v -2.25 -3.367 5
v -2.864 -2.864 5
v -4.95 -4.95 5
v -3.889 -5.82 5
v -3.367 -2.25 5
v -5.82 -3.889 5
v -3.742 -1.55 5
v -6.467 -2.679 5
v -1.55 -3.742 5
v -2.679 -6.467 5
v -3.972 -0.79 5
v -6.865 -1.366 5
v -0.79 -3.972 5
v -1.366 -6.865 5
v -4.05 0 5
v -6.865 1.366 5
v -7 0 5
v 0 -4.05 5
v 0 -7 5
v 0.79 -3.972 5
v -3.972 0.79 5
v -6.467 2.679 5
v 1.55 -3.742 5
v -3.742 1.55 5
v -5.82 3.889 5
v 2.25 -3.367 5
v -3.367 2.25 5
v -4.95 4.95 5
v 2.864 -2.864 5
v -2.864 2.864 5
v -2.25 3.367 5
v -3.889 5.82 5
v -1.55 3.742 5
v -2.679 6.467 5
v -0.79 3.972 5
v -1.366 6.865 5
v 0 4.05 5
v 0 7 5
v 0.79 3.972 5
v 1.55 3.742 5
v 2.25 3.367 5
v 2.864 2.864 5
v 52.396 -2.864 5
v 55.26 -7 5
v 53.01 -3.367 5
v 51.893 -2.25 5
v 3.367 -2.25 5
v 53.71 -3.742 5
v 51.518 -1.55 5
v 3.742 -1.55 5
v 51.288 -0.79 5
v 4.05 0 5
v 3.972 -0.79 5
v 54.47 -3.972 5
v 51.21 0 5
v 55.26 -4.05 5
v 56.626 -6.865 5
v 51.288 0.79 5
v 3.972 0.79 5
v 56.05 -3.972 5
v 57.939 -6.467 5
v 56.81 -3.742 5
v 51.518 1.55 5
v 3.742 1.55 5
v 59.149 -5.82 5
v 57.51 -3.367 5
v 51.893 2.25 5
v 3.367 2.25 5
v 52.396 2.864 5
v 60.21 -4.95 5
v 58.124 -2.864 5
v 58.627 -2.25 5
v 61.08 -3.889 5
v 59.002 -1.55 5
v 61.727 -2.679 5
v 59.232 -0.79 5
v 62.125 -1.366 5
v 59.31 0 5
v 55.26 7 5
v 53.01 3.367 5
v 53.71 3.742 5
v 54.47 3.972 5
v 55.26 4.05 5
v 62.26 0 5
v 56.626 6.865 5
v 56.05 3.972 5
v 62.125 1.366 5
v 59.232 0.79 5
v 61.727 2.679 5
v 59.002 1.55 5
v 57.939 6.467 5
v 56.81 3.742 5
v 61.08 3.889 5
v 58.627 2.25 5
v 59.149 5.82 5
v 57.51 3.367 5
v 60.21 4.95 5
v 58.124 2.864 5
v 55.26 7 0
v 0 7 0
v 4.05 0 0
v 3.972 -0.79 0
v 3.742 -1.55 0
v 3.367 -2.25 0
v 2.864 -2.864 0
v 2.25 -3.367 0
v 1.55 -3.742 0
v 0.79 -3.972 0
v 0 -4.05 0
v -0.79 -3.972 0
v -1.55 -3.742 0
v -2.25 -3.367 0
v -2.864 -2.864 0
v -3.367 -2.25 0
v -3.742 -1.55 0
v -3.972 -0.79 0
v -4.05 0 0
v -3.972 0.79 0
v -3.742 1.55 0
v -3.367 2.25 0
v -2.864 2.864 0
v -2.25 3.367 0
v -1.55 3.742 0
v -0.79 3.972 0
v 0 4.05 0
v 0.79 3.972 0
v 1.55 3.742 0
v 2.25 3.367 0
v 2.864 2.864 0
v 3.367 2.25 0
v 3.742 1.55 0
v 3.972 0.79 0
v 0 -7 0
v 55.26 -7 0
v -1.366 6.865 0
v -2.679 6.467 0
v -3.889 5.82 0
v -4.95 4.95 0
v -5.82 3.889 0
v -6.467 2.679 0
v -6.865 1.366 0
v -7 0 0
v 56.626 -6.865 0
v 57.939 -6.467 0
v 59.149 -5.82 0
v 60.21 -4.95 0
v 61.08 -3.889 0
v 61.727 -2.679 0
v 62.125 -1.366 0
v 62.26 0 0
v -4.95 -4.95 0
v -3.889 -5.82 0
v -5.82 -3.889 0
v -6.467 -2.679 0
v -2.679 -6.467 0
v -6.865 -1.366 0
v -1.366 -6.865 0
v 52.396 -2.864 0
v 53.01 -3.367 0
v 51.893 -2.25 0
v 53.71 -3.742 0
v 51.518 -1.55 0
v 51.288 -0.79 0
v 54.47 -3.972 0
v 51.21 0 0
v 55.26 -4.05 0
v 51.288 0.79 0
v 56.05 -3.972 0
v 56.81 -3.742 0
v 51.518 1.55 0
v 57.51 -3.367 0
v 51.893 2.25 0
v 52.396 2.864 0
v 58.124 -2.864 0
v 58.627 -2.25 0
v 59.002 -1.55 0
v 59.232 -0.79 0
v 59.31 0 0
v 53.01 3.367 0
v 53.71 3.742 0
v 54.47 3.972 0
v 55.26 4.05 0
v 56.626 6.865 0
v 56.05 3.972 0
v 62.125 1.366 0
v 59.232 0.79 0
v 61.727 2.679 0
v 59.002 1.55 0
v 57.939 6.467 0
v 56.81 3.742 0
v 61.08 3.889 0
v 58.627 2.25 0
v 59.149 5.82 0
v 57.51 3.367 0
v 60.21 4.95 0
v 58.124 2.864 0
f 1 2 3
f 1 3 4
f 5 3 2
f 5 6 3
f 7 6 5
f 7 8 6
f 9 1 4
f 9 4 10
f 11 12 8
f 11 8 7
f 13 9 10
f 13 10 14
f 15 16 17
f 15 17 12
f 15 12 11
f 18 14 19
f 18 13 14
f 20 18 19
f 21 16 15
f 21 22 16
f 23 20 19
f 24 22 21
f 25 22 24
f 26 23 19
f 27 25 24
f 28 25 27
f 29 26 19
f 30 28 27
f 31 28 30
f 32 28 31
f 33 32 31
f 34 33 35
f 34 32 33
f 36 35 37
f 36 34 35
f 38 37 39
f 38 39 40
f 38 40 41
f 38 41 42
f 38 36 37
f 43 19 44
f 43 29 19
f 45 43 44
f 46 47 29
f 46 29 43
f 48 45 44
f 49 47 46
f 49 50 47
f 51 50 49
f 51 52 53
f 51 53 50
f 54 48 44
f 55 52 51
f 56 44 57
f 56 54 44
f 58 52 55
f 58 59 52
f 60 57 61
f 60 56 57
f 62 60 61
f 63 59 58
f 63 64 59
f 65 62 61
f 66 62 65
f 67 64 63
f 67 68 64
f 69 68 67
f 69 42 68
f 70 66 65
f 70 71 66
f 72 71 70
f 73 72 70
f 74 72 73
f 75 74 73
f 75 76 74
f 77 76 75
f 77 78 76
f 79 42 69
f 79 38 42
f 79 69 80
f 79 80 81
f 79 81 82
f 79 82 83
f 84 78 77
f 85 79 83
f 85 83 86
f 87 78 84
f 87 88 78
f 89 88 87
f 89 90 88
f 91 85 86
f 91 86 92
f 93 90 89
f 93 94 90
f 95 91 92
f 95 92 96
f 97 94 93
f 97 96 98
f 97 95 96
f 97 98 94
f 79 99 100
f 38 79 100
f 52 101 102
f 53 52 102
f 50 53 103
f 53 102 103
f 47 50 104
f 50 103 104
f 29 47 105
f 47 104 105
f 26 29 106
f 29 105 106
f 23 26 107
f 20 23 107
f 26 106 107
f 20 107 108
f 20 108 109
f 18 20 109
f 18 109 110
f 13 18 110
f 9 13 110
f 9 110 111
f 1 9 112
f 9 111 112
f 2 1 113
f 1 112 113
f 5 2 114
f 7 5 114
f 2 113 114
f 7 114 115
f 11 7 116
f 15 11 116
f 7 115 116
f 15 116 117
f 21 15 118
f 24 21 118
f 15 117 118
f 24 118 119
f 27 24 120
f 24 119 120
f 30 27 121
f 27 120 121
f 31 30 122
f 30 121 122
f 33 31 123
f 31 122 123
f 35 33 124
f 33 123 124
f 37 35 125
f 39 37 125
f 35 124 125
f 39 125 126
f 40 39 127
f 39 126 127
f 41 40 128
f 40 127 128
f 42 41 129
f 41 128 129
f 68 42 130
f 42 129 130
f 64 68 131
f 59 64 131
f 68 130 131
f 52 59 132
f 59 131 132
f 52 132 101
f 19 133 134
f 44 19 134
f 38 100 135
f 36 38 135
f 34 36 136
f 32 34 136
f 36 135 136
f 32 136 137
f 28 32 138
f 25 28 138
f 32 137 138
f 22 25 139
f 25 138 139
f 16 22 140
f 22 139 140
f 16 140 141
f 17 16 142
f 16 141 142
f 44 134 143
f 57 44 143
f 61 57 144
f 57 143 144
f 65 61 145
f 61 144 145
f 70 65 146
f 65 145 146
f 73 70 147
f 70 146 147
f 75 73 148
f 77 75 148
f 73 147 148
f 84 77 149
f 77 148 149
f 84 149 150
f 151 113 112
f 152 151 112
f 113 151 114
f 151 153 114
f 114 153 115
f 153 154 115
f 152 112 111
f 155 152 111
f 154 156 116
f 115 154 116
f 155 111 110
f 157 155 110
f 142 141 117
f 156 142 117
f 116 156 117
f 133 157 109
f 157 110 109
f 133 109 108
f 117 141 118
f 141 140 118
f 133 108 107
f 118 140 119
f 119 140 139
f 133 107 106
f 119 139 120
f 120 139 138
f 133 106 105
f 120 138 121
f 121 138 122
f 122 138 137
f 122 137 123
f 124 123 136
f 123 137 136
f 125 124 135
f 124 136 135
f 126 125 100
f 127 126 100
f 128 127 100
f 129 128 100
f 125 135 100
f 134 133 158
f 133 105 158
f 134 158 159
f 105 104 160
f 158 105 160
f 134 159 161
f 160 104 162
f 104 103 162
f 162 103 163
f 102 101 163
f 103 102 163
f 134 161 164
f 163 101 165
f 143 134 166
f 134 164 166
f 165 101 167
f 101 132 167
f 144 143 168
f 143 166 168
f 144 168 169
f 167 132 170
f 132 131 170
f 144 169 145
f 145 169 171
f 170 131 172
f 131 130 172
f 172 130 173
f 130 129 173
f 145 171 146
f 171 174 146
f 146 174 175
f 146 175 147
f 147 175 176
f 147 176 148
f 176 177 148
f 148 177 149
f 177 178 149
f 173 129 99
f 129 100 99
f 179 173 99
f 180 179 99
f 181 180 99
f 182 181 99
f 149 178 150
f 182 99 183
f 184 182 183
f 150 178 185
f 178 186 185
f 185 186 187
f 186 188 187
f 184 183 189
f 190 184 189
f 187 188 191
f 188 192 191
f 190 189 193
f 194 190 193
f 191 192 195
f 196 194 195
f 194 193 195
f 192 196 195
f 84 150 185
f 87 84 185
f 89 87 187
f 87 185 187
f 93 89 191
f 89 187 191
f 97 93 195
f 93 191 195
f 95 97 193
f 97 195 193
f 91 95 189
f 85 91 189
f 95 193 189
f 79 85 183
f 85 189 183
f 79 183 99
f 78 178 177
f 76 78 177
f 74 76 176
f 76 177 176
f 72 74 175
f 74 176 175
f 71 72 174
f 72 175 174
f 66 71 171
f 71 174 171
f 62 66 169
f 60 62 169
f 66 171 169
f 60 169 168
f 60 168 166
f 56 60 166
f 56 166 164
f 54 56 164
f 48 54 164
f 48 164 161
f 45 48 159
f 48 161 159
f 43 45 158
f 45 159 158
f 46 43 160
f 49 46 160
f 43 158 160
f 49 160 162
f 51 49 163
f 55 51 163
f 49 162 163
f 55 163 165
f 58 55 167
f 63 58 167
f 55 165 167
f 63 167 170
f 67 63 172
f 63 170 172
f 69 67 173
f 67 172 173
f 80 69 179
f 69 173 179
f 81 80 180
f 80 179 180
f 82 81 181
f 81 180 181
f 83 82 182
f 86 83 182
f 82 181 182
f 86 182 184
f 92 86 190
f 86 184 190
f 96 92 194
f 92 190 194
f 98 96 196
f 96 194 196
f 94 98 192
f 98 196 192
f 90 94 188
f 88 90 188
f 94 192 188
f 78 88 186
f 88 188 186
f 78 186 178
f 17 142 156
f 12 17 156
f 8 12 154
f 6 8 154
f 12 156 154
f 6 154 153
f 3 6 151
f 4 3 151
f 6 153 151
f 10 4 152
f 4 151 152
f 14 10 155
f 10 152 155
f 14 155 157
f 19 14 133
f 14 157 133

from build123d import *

# Parameters (mm, degrees)
EXTRUDE_1_DEPTH = 5


with BuildPart() as part:
    # 草图1 → 凸台-拉伸1 (new body)
    with BuildSketch(Plane.XY):
        with BuildLine():
            ThreePointArc((0, 7), (4.949747468, 4.949747468), (7, 0))
            Line((7, 0), (48.26, 0))
            ThreePointArc((48.26, 0), (50.310252532, 4.949747468), (55.26, 7))
            Line((55.26, 7), (0, 7))
        make_face()
        with BuildLine():
            ThreePointArc((55.26, 7), (50.310252532, 4.949747468), (48.26, 0))
            Line((48.26, 0), (51.21, 0))
            ThreePointArc((51.21, 0), (55.26, 4.05), (59.31, 0))
            Line((59.31, 0), (62.26, 0))
            ThreePointArc((62.26, 0), (60.209747468, 4.949747468), (55.26, 7))
        make_face()
        with BuildLine():
            Line((51.21, 0), (48.26, 0))
            ThreePointArc((48.26, 0), (50.310252532, -4.949747468), (55.26, -7))
            ThreePointArc((55.26, -7), (60.209747468, -4.949747468), (62.26, 0))
            Line((62.26, 0), (59.31, 0))
            ThreePointArc((59.31, 0), (55.26, -4.05), (51.21, 0))
        make_face()
        with BuildLine():
            Line((48.26, 0), (7, 0))
            ThreePointArc((7, 0), (4.949747468, -4.949747468), (0, -7))
            Line((0, -7), (55.26, -7))
            ThreePointArc((55.26, -7), (50.310252532, -4.949747468), (48.26, 0))
        make_face()
        with BuildLine():
            ThreePointArc((-4.05, 0), (0, 4.05), (4.05, 0))
            Line((4.05, 0), (7, 0))
            ThreePointArc((7, 0), (4.949747468, 4.949747468), (0, 7))
            ThreePointArc((0, 7), (-4.949747468, 4.949747468), (-7, 0))
            Line((-7, 0), (-4.05, 0))
        make_face()
        with BuildLine():
            Line((7, 0), (4.05, 0))
            ThreePointArc((4.05, 0), (0, -4.05), (-4.05, 0))
            Line((-4.05, 0), (-7, 0))
            ThreePointArc((-7, 0), (-4.949747468, -4.949747468), (0, -7))
            ThreePointArc((0, -7), (4.949747468, -4.949747468), (7, 0))
        make_face()
    extrude(amount=EXTRUDE_1_DEPTH)


solid = part.part
